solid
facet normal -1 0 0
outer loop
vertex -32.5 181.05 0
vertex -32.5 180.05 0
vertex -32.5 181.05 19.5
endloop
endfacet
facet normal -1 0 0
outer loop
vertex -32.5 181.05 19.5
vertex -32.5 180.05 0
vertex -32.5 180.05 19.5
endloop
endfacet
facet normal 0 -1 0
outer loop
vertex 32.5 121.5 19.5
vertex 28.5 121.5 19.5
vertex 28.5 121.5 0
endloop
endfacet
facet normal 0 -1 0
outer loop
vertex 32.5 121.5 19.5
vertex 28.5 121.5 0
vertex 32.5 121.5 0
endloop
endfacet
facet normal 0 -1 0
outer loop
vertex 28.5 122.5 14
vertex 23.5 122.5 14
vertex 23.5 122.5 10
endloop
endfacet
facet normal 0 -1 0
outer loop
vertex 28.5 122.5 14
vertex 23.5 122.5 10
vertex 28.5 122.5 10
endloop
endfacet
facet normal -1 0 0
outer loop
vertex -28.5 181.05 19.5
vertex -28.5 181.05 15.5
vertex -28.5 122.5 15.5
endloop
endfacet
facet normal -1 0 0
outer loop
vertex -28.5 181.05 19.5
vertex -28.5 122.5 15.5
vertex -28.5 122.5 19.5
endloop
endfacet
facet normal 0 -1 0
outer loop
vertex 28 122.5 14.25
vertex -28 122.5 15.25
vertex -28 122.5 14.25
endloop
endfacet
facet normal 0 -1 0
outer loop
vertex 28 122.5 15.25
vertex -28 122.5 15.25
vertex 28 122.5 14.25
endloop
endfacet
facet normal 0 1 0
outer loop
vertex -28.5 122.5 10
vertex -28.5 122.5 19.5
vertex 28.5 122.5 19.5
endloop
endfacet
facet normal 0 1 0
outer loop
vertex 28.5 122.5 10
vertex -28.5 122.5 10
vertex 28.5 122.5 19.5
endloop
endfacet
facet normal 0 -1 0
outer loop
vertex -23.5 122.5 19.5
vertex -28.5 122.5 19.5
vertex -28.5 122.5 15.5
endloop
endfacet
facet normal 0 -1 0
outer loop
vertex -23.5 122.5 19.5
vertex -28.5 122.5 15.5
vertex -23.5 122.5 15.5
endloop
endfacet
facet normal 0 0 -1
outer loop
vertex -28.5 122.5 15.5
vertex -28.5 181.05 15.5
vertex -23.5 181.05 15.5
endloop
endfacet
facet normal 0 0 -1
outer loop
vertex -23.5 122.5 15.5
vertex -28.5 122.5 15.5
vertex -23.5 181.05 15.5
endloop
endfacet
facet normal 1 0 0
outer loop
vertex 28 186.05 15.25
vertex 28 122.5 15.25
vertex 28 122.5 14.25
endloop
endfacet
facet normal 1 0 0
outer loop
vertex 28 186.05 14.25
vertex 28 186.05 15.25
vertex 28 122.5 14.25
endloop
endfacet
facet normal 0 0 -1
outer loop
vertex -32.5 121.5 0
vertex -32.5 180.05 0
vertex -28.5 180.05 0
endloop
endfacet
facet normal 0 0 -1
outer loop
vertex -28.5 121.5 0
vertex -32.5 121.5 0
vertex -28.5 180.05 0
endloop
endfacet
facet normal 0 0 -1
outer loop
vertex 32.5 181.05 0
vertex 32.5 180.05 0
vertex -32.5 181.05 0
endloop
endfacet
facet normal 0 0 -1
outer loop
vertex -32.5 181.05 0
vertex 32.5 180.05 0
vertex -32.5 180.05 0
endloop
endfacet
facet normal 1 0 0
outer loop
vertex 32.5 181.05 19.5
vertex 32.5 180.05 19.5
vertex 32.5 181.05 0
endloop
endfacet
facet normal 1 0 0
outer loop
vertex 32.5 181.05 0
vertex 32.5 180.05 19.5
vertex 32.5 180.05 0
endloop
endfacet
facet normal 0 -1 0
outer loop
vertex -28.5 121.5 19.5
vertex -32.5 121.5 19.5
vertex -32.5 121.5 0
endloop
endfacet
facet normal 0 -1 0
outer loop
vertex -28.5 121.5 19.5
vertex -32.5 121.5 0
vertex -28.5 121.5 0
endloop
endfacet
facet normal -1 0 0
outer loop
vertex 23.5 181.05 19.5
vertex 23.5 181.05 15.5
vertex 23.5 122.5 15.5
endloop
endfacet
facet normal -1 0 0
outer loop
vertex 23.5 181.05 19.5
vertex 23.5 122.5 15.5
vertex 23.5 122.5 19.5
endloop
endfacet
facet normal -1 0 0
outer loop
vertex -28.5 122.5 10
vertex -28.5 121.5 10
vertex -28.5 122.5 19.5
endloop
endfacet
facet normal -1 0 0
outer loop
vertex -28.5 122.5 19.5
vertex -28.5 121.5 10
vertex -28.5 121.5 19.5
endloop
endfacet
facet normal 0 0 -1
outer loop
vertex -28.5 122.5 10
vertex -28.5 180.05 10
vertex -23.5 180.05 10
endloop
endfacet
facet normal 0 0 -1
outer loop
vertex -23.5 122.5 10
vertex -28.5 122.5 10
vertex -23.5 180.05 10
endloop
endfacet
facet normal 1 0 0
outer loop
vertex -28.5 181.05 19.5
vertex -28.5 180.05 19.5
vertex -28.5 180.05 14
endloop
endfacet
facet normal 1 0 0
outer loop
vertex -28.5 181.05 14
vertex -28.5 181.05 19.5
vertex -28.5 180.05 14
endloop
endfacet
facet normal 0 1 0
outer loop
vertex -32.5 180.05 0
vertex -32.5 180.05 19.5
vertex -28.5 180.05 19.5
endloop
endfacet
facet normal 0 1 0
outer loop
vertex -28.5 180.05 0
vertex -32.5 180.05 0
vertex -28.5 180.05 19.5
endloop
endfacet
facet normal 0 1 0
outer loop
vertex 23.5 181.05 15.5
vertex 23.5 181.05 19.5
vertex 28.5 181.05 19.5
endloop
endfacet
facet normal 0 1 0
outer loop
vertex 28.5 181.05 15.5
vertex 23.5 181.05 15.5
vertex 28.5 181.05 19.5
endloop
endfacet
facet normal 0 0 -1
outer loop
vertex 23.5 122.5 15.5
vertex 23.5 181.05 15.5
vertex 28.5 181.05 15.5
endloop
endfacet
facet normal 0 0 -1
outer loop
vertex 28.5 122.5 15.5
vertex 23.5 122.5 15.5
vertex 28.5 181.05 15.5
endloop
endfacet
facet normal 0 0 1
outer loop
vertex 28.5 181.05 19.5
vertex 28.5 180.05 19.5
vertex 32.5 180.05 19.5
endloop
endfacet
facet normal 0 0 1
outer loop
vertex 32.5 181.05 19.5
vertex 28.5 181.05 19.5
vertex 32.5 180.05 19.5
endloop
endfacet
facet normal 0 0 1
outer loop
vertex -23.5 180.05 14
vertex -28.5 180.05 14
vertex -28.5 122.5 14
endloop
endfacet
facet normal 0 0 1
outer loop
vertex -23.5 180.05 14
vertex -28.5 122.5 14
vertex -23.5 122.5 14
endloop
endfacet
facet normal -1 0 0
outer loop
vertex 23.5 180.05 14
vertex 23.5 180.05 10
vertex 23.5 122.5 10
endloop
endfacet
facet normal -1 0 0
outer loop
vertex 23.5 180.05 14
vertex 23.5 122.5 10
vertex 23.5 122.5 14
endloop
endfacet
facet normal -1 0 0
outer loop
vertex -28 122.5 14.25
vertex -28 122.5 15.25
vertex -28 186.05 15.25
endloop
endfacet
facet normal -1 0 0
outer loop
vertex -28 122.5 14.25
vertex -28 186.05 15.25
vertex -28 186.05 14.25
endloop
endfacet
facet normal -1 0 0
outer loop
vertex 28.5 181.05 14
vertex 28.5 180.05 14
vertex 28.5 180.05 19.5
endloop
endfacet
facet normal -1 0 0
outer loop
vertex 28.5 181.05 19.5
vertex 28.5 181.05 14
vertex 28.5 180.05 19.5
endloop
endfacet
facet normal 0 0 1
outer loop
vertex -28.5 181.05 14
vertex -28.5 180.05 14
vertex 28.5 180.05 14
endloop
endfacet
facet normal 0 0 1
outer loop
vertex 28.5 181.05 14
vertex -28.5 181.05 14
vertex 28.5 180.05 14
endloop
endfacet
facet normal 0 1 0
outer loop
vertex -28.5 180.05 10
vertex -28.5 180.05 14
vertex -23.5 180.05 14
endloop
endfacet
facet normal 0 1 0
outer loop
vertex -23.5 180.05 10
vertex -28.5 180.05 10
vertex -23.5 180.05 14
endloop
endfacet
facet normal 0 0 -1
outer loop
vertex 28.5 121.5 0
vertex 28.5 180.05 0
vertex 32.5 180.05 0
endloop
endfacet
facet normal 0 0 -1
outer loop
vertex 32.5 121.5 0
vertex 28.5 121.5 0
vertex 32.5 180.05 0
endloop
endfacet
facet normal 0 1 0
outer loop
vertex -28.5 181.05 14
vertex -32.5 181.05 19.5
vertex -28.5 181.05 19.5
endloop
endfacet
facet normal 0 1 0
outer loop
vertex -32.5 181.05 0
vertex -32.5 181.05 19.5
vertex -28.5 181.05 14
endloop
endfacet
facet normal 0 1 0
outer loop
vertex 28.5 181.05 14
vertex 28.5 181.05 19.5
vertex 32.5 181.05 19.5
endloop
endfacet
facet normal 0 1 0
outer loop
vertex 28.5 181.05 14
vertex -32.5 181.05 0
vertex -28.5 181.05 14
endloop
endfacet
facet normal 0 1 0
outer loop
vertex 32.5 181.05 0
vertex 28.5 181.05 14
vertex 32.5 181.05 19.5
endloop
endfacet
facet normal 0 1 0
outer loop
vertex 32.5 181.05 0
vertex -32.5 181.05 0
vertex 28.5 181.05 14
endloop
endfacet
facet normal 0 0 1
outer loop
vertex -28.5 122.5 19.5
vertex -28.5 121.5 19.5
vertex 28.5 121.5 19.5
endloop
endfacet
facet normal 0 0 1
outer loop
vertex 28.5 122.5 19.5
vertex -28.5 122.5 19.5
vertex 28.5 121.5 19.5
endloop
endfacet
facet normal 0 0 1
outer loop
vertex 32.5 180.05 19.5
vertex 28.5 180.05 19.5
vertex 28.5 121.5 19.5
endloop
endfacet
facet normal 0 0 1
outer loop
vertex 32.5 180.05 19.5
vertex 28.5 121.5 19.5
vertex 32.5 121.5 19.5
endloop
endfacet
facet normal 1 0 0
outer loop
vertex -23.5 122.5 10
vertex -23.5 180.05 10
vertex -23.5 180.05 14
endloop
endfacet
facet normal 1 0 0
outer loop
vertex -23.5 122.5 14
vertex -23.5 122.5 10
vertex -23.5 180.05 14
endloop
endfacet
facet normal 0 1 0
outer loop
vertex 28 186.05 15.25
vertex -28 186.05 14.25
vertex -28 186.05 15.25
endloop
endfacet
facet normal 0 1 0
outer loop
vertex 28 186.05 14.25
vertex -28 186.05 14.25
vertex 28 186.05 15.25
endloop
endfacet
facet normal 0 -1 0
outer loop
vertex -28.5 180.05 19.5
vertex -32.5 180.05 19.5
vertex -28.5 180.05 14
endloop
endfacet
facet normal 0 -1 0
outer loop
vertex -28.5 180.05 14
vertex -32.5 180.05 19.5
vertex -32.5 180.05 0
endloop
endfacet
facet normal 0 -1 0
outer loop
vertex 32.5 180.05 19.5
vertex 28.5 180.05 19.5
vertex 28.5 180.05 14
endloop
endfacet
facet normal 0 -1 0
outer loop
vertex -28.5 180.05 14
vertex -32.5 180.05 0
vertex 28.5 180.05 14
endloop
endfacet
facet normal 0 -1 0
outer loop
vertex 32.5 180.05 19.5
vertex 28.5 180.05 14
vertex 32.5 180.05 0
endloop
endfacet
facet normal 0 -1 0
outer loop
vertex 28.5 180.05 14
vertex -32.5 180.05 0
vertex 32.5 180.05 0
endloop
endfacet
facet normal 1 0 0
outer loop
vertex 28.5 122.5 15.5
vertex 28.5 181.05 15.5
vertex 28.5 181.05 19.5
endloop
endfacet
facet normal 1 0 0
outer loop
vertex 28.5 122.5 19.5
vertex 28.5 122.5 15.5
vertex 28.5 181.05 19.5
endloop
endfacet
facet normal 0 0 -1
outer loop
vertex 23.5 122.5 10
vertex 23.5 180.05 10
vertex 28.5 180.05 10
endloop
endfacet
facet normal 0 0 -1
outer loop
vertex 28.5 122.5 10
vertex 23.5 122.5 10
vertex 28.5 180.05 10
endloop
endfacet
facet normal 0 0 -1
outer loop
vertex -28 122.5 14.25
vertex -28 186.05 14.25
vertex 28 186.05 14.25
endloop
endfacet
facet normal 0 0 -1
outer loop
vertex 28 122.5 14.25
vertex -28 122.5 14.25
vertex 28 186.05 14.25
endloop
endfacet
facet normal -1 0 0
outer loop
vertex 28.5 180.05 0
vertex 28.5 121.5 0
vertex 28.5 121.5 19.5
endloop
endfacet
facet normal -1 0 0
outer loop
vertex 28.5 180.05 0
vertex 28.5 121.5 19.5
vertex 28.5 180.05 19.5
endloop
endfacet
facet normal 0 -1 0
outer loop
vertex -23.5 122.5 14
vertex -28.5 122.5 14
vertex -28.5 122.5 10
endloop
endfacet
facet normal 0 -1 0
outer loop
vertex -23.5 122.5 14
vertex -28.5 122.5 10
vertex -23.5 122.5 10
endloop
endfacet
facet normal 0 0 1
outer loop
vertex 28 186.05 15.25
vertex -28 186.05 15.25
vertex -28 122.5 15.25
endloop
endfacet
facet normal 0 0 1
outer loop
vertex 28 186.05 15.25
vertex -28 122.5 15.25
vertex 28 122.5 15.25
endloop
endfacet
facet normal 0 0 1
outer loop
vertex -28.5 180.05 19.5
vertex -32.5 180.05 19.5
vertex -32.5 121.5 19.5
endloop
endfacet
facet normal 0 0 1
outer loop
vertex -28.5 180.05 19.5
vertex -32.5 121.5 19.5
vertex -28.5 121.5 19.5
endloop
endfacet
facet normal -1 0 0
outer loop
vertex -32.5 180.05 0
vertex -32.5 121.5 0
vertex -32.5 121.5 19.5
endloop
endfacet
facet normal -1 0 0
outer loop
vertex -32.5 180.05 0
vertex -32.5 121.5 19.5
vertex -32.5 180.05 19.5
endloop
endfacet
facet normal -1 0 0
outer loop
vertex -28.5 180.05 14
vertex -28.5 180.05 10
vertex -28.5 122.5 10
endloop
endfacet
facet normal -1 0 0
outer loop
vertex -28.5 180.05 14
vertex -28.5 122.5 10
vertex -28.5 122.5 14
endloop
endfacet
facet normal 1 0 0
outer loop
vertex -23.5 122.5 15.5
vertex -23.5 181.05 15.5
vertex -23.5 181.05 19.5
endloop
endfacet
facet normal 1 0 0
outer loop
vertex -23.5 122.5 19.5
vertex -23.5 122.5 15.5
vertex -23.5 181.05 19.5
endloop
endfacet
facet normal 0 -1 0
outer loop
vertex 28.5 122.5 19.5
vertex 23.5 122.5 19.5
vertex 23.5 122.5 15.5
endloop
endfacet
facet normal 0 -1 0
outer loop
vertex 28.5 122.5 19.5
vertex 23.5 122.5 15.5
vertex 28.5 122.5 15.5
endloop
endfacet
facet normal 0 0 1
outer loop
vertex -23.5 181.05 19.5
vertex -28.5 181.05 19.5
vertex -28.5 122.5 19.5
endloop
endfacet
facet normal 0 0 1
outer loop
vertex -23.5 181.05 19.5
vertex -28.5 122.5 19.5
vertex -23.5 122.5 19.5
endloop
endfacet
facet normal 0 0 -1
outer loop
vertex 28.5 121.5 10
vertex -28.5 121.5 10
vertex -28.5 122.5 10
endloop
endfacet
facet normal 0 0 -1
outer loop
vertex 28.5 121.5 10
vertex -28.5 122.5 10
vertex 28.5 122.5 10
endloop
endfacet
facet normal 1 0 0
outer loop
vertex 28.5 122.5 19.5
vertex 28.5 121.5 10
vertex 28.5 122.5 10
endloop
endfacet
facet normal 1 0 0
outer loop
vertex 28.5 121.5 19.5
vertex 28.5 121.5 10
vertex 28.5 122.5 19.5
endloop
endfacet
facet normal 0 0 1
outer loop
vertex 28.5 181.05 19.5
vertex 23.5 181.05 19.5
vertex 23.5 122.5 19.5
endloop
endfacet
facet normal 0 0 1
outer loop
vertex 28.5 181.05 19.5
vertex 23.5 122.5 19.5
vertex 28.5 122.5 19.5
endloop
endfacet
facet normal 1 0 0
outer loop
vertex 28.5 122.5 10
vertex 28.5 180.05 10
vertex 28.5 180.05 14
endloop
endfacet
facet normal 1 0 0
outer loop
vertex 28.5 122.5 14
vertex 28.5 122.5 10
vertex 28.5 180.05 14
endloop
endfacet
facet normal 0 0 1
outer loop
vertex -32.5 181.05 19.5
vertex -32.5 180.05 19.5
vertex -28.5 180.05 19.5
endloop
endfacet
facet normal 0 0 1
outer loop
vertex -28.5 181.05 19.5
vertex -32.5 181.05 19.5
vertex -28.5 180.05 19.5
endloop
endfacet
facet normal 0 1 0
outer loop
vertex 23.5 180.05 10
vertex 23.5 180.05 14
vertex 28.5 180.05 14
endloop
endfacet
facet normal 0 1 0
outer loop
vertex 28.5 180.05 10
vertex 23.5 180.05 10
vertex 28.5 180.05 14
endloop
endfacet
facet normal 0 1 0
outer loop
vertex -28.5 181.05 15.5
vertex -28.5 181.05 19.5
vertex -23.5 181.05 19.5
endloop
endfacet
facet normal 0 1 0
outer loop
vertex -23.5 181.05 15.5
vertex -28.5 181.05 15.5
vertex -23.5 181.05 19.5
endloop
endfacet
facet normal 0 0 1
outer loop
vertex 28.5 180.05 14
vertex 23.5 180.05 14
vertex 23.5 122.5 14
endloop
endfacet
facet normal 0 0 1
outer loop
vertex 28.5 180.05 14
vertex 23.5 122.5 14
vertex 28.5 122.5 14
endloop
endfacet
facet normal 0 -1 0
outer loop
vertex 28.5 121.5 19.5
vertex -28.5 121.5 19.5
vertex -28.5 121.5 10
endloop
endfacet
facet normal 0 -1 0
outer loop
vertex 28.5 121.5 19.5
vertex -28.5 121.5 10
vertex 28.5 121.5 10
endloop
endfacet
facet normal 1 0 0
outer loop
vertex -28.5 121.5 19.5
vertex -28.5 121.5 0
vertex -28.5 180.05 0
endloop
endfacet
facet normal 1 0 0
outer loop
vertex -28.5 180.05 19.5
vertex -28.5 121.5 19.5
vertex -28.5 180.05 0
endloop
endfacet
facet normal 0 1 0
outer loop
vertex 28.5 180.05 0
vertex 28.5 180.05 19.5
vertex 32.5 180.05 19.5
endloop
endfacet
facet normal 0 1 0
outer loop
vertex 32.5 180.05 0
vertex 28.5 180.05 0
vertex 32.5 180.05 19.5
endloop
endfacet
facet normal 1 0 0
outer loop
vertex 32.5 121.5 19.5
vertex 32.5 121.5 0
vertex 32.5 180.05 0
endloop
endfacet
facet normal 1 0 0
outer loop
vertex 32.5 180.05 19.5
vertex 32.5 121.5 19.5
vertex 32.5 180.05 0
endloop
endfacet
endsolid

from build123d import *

# Parameters (mm, degrees)
SKETCH_6_W          = 4
SKETCH_6_H          = 58.55
EXTRUDE_8_DEPTH     = 19.5
EXTRUDE_8_2_DEPTH   = 19.5
EXTRUDE_9_DEPTH     = 1
SKETCH_8_W          = 5
SKETCH_8_H          = 4
EXTRUDE_10_DEPTH    = 58.55
EXTRUDE_10_2_DEPTH  = 58.55
SKETCH_8_3_W        = 5
SKETCH_8_3_H        = 4
EXTRUDE_11_DEPTH    = 59.55
EXTRUDE_11_2_DEPTH  = 59.55
SKETCH_9_W          = 56
SKETCH_9_H          = 1
EXTRUDE_12_DEPTH    = 59.55
SKETCH_10_W         = 56
SKETCH_10_H         = 1
EXTRUDE_13_DEPTH    = 5
SKETCH_11_W         = 5
SKETCH_11_H         = 4
CUT_EXTRUDE_5_DEPTH = 1
SKETCH_12_W         = 57
SKETCH_12_H         = 9.5
EXTRUDE_14_DEPTH    = 1
SKETCH_13_W         = 56
SKETCH_13_H         = 1
CUT_EXTRUDE_6_DEPTH = 1
SKETCH_14_W         = 57
SKETCH_14_H         = 9.5
EXTRUDE_15_DEPTH    = 1


with BuildPart() as part:
    # 스케치6 → 보스-돌출8 (new body)
    with BuildSketch(Plane.XY):
        with Locations((-30.5, 150.775)):
            Rectangle(SKETCH_6_W, SKETCH_6_H)
    extrude(amount=EXTRUDE_8_DEPTH)


with BuildPart() as body_2:
    # 스케치6 → Extrude 8 2 (new body)
    with BuildSketch(Plane.XY):
        with Locations((30.5, 150.775)):
            Rectangle(SKETCH_6_W, SKETCH_6_H)
    extrude(amount=EXTRUDE_8_2_DEPTH)


with BuildPart() as body_3:
    # 스케치7 → 보스-돌출9 (new body)
    with BuildSketch(Plane(origin=(0, 180.05, 0), x_dir=(1, 0, 0), z_dir=(0, 1, 0))):
        Polygon((-32.5, 0), (-32.5, -19.5), (-28.5, -19.5), (-28.5, -14), (28.5, -14), (28.5, -19.5), (32.5, -19.5), (32.5, 0), align=None)
    extrude(amount=EXTRUDE_9_DEPTH)


with BuildPart() as body_4:
    # 스케치8 → 보스-돌출10 (new body)
    with BuildSketch(Plane.XZ.offset(-121.5)):
        with Locations((-26, 12)):
            Rectangle(SKETCH_8_W, SKETCH_8_H)
    extrude(amount=-EXTRUDE_10_DEPTH)


with BuildPart() as body_5:
    # 스케치8 → Extrude 10 2 (new body)
    with BuildSketch(Plane.XZ.offset(-121.5)):
        with Locations((26, 12)):
            Rectangle(SKETCH_8_W, SKETCH_8_H)
    extrude(amount=-EXTRUDE_10_2_DEPTH)


with BuildPart() as body_6:
    # 스케치8<3> → 보스-돌출11 (new body)
    with BuildSketch(Plane.XZ.offset(-121.5)):
        with Locations((-26, 17.5)):
            Rectangle(SKETCH_8_3_W, SKETCH_8_3_H)
    extrude(amount=-EXTRUDE_11_DEPTH)


with BuildPart() as body_7:
    # 스케치8<3> → Extrude 11 2 (new body)
    with BuildSketch(Plane.XZ.offset(-121.5)):
        with Locations((26, 17.5)):
            Rectangle(SKETCH_8_3_W, SKETCH_8_3_H)
    extrude(amount=-EXTRUDE_11_2_DEPTH)


with BuildPart() as body_8:
    # 스케치9 → 보스-돌출12 (new body)
    with BuildSketch(Plane(origin=(0, 181.05, 0), x_dir=(1, 0, 0), z_dir=(0, 1, 0))):
        with Locations((0, -14.75)):
            Rectangle(SKETCH_9_W, SKETCH_9_H)
    extrude(amount=-EXTRUDE_12_DEPTH)

    # 스케치10 → 보스-돌출13 (add)
    with BuildSketch(Plane(origin=(0, 181.05, 0), x_dir=(1, 0, 0), z_dir=(0, 1, 0))):
        with Locations((0, -14.75)):
            Rectangle(SKETCH_10_W, SKETCH_10_H)
    extrude(amount=EXTRUDE_13_DEPTH)

    # 스케치13 → 컷-돌출6 (cut)
    with BuildSketch(Plane.XZ.offset(-121.5)):
        with Locations((0, 14.75)):
            Rectangle(SKETCH_13_W, SKETCH_13_H)
    extrude(amount=-CUT_EXTRUDE_6_DEPTH, mode=Mode.SUBTRACT)


with BuildPart() as cut_extrude_5_tool:
    # 스케치11 → 컷-돌출5 (new body)
    with BuildSketch(Plane.XZ.offset(-121.5)):
        with Locations((-26, 17.5)):
            Rectangle(SKETCH_11_W, SKETCH_11_H)
        with Locations((-26, 12)):
            Rectangle(SKETCH_11_W, SKETCH_11_H)
        with Locations((26, 12)):
            Rectangle(SKETCH_11_W, SKETCH_11_H)
        with Locations((26, 17.5)):
            Rectangle(SKETCH_11_W, SKETCH_11_H)
    extrude(amount=-CUT_EXTRUDE_5_DEPTH)


with BuildPart() as body_4_1:
    add(body_4.part)

    # 컷-돌출5: cut by cut_extrude_5_tool
    add(cut_extrude_5_tool.part, mode=Mode.SUBTRACT)


with BuildPart() as body_5_1:
    add(body_5.part)

    # 컷-돌출5: cut by cut_extrude_5_tool
    add(cut_extrude_5_tool.part, mode=Mode.SUBTRACT)


with BuildPart() as body_6_1:
    add(body_6.part)

    # 컷-돌출5: cut by cut_extrude_5_tool
    add(cut_extrude_5_tool.part, mode=Mode.SUBTRACT)


with BuildPart() as body_7_1:
    add(body_7.part)

    # 컷-돌출5: cut by cut_extrude_5_tool
    add(cut_extrude_5_tool.part, mode=Mode.SUBTRACT)


with BuildPart() as body_9:
    # 스케치12 → 보스-돌출14 (new body)
    with BuildSketch(Plane.XZ.offset(-121.5)):
        with Locations((0, 14.75)):
            Rectangle(SKETCH_12_W, SKETCH_12_H)
    extrude(amount=-EXTRUDE_14_DEPTH)


with BuildPart() as body_10:
    # 스케치14 → 보스-돌출15 (new body)
    with BuildSketch(Plane.XZ.offset(-121.5)):
        with Locations((0, 14.75)):
            Rectangle(SKETCH_14_W, SKETCH_14_H)
    extrude(amount=-EXTRUDE_15_DEPTH)


solid = Compound([part.part, body_2.part, body_3.part, body_8.part, body_4_1.part, body_5_1.part, body_6_1.part, body_7_1.part, body_9.part])
